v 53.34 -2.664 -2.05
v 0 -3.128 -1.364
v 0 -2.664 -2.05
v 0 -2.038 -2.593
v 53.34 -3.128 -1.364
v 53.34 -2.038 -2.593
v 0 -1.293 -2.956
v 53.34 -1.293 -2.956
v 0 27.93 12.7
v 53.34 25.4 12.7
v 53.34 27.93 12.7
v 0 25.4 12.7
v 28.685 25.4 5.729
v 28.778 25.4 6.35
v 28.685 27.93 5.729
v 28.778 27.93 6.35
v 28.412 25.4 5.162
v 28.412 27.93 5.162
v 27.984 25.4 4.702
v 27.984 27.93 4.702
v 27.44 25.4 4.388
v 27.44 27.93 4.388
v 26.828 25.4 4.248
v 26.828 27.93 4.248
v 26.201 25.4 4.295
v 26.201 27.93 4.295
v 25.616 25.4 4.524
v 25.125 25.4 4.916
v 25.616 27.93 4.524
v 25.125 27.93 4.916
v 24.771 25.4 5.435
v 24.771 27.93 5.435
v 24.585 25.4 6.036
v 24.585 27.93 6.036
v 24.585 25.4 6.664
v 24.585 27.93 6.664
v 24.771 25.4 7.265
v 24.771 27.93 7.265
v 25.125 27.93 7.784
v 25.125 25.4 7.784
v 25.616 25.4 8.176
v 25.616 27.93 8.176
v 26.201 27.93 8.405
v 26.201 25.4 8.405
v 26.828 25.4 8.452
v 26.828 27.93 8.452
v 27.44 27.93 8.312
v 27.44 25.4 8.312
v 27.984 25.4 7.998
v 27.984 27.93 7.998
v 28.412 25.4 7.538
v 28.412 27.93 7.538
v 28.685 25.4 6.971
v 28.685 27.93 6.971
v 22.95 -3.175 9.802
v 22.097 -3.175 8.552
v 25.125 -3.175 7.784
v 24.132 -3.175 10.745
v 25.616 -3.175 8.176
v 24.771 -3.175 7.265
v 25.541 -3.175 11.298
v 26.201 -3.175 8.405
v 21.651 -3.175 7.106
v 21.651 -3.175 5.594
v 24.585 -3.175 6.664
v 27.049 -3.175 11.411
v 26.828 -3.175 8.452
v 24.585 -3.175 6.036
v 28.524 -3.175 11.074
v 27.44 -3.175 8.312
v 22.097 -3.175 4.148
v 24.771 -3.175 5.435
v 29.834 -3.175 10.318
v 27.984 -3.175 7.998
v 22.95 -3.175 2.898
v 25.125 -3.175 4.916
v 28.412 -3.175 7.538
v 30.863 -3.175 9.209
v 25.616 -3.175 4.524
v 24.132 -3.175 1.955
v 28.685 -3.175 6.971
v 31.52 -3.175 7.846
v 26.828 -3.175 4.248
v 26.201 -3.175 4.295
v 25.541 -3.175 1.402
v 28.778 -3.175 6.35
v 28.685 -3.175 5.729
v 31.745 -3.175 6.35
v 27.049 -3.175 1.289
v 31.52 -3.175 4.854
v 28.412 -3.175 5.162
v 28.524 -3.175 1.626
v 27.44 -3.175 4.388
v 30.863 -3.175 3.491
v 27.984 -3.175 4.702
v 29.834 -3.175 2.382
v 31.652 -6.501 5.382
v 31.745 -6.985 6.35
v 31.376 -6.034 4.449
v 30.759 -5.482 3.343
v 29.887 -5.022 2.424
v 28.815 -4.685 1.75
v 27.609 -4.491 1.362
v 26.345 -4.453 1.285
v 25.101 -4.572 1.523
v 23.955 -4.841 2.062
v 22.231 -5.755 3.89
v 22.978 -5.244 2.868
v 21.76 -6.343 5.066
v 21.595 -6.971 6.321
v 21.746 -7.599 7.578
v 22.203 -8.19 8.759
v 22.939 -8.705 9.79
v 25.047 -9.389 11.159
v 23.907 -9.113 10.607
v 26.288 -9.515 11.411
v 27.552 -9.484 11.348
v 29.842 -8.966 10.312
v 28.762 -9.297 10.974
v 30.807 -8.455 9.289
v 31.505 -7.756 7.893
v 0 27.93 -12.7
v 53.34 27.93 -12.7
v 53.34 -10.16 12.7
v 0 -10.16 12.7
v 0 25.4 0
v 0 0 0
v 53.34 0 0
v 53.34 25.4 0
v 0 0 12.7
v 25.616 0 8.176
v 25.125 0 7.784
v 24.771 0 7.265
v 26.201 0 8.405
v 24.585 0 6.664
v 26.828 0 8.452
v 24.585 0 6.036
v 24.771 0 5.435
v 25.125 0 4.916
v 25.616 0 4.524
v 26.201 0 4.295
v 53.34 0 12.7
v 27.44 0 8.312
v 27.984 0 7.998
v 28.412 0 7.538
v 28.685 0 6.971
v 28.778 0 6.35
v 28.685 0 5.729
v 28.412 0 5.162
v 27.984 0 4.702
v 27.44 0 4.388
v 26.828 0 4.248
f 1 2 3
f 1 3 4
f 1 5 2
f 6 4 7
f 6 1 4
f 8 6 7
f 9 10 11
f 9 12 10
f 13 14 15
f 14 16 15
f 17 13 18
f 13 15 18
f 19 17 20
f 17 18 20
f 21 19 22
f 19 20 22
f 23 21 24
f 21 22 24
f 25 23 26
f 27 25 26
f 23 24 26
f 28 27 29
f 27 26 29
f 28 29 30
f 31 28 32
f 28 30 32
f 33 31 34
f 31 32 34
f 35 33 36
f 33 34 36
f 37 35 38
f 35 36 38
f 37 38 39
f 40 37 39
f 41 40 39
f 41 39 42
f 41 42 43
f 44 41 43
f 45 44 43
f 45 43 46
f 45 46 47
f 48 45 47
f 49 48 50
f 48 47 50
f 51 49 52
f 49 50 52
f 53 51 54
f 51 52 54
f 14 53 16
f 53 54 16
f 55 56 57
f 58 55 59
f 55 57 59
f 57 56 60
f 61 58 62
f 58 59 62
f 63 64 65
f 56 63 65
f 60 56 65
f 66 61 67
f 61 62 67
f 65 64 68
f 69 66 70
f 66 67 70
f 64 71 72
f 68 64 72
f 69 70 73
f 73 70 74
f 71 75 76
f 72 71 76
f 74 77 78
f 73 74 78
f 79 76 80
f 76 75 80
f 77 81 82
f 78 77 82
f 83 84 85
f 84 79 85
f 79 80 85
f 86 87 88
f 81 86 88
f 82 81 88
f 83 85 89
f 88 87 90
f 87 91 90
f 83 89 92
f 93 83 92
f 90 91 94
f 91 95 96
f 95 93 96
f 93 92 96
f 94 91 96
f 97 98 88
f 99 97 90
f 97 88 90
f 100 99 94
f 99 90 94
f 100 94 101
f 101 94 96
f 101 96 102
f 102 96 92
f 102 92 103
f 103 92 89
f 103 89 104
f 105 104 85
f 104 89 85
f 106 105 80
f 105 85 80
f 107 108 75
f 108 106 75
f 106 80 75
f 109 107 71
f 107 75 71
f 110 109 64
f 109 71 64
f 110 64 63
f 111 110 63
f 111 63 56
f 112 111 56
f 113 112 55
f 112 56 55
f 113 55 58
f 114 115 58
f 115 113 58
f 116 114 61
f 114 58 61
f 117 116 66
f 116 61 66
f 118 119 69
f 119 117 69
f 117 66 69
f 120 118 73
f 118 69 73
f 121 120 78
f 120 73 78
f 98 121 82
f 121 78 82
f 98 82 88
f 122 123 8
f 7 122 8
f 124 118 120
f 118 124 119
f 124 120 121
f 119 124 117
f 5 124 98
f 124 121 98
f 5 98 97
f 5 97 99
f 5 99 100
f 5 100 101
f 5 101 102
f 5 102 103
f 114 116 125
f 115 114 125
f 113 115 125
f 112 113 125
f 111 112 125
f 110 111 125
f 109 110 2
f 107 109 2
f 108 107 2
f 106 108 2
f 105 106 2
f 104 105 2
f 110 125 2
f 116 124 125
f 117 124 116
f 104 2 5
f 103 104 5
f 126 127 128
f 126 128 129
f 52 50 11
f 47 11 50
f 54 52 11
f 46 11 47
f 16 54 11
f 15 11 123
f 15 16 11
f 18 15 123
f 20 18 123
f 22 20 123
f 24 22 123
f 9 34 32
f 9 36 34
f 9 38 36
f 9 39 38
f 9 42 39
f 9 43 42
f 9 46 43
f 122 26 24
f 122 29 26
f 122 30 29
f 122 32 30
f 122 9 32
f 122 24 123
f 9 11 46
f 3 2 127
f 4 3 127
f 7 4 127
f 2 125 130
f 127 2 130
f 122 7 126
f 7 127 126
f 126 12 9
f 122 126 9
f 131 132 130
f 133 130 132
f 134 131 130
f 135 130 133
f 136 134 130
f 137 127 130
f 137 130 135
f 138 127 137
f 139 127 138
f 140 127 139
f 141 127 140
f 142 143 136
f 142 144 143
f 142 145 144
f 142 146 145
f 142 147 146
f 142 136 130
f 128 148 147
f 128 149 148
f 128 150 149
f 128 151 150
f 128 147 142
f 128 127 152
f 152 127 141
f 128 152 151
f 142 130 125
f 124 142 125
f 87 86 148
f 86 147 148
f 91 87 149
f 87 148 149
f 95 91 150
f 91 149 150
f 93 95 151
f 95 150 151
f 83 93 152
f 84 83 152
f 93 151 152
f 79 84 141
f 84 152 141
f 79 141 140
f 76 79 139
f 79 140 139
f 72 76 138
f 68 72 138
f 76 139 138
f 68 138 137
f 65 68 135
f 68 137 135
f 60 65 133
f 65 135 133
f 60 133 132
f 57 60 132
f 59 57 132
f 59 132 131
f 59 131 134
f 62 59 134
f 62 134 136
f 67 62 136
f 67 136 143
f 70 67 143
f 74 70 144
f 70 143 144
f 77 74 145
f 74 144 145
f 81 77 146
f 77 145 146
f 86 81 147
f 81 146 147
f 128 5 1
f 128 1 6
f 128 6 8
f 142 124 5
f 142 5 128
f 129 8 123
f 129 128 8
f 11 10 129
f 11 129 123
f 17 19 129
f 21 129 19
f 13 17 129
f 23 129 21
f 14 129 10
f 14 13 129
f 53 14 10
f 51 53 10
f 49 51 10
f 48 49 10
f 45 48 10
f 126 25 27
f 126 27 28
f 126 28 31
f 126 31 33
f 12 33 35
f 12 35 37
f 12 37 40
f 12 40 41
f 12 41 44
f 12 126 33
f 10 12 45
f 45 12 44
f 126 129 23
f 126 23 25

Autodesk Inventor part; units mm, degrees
ref_plane "YZ Plane" through (0, 0, 0) normal (1, 0, 0) x (0, 1, 0)
ref_plane "XZ Plane" through (0, 0, 0) normal (0, 1, 0) x (-1, 0, 0)
ref_plane "XY Plane" through (0, 0, 0) normal (0, 0, 1) x (1, 0, 0)
sketch "Sketch1" plane through (0, 0, 0) normal (1, 0, 0) x (0, 1, 0)
  line L0 (0, 0) -> (25.4, 0)
  line L1 (25.4, 0) -> (25.4, 12.7)
  line L2 (0, 0) -> (0, 12.7)
  line L3 (25.4, 12.7) -> (27.9305, 12.7)
  line L4 (27.9305, 12.7) -> (27.9305, 0)
  line L5 (0, 12.7) -> (-2.54, 12.7)
  line L6 (-2.54, 12.7) -> (-2.54, 0)
  line L7 (-2.54, 0) -> (-2.54, -2.54)
  line L8 (27.9305, -2.54) -> (27.9305, 0)
  line L9 (-2.54, -2.54) -> (-2.54, -12.7002)
  line L10 (27.9305, -12.7002) -> (27.9305, -2.54)
  line L11 (27.9305, -12.7002) -> (-2.54, -2.54)
  line L12 (-2.54, 12.7) -> (-10.16, 12.7)
  line L13 (-10.16, 12.7) -> (-2.54, -2.54)
  line L14 (-2.54, -2.54) -> (0, -2.54)
  dimension "d0" = 25.4
  dimension "d1" = 12.7
  dimension "d2" = 2.54
  dimension "d3" = 2.54
  dimension "d4" = 7.62
extrude "Extrusion1" add sketch "Sketch1" along normal blind 53.34
sketch "Sketch2" plane through (0, 27.9305, 12.7) normal (0, 1, 0) x (1, 0, 0)
  line L0 (0, 0) -> (0, 12.7) projected
  line L1 (0, 0) -> (0, 6.35)
  line L2 (0, 6.35) -> (26.67, 6.35)
  circle A0 centre (26.67, 6.35) radius 2.1082
  dimension "d7" = 6.35
  dimension "d8" = 26.67
  dimension "d9" = 4.2164
extrude "Extrusion2" cut sketch "Sketch2" against normal blind 54.61
sketch "Sketch3" plane through (0, 0, 0) normal (-1, 0, 0) x (0, 0, 1)
  point P0 (0, 0)
sketch "Sketch4" plane through (0, 0, 12.7) normal (0, 1, 0) x (1, 0, 0)
  circle A0 centre (26.67, 6.35) radius 2.1082 projected
  circle A1 centre (26.67, 6.35) radius 2.1082
  circle A2 centre (26.67, 6.35) radius 5.0752
  point P0 (0, 12.7)
extrude "Extrusion3" cut sketch "Sketch4" against normal up to surface from surface at 0 surface through (0, -10.16, 12.7) normal (0, -0.8944, -0.4472)
sketch "Sketch5" plane through (0, 0, 12.7) normal (0, 1, 0) x (1, 0, 0)
  circle A0 centre (26.67, 6.35) radius 5.0752 projected
  circle A1 centre (26.67, 6.35) radius 5.0752
  circle A2 centre (26.67, 6.35) radius 2.1082
  point P0 (0, 12.7)
  dimension "d14" = 4.2164
extrude "Extrusion4" add sketch "Sketch5" against normal blind 3.175
fillet "Fillet1" radius 3.175 1 edges at (26.67, -2.54, -2.54)
properties part number "sleds v1"
